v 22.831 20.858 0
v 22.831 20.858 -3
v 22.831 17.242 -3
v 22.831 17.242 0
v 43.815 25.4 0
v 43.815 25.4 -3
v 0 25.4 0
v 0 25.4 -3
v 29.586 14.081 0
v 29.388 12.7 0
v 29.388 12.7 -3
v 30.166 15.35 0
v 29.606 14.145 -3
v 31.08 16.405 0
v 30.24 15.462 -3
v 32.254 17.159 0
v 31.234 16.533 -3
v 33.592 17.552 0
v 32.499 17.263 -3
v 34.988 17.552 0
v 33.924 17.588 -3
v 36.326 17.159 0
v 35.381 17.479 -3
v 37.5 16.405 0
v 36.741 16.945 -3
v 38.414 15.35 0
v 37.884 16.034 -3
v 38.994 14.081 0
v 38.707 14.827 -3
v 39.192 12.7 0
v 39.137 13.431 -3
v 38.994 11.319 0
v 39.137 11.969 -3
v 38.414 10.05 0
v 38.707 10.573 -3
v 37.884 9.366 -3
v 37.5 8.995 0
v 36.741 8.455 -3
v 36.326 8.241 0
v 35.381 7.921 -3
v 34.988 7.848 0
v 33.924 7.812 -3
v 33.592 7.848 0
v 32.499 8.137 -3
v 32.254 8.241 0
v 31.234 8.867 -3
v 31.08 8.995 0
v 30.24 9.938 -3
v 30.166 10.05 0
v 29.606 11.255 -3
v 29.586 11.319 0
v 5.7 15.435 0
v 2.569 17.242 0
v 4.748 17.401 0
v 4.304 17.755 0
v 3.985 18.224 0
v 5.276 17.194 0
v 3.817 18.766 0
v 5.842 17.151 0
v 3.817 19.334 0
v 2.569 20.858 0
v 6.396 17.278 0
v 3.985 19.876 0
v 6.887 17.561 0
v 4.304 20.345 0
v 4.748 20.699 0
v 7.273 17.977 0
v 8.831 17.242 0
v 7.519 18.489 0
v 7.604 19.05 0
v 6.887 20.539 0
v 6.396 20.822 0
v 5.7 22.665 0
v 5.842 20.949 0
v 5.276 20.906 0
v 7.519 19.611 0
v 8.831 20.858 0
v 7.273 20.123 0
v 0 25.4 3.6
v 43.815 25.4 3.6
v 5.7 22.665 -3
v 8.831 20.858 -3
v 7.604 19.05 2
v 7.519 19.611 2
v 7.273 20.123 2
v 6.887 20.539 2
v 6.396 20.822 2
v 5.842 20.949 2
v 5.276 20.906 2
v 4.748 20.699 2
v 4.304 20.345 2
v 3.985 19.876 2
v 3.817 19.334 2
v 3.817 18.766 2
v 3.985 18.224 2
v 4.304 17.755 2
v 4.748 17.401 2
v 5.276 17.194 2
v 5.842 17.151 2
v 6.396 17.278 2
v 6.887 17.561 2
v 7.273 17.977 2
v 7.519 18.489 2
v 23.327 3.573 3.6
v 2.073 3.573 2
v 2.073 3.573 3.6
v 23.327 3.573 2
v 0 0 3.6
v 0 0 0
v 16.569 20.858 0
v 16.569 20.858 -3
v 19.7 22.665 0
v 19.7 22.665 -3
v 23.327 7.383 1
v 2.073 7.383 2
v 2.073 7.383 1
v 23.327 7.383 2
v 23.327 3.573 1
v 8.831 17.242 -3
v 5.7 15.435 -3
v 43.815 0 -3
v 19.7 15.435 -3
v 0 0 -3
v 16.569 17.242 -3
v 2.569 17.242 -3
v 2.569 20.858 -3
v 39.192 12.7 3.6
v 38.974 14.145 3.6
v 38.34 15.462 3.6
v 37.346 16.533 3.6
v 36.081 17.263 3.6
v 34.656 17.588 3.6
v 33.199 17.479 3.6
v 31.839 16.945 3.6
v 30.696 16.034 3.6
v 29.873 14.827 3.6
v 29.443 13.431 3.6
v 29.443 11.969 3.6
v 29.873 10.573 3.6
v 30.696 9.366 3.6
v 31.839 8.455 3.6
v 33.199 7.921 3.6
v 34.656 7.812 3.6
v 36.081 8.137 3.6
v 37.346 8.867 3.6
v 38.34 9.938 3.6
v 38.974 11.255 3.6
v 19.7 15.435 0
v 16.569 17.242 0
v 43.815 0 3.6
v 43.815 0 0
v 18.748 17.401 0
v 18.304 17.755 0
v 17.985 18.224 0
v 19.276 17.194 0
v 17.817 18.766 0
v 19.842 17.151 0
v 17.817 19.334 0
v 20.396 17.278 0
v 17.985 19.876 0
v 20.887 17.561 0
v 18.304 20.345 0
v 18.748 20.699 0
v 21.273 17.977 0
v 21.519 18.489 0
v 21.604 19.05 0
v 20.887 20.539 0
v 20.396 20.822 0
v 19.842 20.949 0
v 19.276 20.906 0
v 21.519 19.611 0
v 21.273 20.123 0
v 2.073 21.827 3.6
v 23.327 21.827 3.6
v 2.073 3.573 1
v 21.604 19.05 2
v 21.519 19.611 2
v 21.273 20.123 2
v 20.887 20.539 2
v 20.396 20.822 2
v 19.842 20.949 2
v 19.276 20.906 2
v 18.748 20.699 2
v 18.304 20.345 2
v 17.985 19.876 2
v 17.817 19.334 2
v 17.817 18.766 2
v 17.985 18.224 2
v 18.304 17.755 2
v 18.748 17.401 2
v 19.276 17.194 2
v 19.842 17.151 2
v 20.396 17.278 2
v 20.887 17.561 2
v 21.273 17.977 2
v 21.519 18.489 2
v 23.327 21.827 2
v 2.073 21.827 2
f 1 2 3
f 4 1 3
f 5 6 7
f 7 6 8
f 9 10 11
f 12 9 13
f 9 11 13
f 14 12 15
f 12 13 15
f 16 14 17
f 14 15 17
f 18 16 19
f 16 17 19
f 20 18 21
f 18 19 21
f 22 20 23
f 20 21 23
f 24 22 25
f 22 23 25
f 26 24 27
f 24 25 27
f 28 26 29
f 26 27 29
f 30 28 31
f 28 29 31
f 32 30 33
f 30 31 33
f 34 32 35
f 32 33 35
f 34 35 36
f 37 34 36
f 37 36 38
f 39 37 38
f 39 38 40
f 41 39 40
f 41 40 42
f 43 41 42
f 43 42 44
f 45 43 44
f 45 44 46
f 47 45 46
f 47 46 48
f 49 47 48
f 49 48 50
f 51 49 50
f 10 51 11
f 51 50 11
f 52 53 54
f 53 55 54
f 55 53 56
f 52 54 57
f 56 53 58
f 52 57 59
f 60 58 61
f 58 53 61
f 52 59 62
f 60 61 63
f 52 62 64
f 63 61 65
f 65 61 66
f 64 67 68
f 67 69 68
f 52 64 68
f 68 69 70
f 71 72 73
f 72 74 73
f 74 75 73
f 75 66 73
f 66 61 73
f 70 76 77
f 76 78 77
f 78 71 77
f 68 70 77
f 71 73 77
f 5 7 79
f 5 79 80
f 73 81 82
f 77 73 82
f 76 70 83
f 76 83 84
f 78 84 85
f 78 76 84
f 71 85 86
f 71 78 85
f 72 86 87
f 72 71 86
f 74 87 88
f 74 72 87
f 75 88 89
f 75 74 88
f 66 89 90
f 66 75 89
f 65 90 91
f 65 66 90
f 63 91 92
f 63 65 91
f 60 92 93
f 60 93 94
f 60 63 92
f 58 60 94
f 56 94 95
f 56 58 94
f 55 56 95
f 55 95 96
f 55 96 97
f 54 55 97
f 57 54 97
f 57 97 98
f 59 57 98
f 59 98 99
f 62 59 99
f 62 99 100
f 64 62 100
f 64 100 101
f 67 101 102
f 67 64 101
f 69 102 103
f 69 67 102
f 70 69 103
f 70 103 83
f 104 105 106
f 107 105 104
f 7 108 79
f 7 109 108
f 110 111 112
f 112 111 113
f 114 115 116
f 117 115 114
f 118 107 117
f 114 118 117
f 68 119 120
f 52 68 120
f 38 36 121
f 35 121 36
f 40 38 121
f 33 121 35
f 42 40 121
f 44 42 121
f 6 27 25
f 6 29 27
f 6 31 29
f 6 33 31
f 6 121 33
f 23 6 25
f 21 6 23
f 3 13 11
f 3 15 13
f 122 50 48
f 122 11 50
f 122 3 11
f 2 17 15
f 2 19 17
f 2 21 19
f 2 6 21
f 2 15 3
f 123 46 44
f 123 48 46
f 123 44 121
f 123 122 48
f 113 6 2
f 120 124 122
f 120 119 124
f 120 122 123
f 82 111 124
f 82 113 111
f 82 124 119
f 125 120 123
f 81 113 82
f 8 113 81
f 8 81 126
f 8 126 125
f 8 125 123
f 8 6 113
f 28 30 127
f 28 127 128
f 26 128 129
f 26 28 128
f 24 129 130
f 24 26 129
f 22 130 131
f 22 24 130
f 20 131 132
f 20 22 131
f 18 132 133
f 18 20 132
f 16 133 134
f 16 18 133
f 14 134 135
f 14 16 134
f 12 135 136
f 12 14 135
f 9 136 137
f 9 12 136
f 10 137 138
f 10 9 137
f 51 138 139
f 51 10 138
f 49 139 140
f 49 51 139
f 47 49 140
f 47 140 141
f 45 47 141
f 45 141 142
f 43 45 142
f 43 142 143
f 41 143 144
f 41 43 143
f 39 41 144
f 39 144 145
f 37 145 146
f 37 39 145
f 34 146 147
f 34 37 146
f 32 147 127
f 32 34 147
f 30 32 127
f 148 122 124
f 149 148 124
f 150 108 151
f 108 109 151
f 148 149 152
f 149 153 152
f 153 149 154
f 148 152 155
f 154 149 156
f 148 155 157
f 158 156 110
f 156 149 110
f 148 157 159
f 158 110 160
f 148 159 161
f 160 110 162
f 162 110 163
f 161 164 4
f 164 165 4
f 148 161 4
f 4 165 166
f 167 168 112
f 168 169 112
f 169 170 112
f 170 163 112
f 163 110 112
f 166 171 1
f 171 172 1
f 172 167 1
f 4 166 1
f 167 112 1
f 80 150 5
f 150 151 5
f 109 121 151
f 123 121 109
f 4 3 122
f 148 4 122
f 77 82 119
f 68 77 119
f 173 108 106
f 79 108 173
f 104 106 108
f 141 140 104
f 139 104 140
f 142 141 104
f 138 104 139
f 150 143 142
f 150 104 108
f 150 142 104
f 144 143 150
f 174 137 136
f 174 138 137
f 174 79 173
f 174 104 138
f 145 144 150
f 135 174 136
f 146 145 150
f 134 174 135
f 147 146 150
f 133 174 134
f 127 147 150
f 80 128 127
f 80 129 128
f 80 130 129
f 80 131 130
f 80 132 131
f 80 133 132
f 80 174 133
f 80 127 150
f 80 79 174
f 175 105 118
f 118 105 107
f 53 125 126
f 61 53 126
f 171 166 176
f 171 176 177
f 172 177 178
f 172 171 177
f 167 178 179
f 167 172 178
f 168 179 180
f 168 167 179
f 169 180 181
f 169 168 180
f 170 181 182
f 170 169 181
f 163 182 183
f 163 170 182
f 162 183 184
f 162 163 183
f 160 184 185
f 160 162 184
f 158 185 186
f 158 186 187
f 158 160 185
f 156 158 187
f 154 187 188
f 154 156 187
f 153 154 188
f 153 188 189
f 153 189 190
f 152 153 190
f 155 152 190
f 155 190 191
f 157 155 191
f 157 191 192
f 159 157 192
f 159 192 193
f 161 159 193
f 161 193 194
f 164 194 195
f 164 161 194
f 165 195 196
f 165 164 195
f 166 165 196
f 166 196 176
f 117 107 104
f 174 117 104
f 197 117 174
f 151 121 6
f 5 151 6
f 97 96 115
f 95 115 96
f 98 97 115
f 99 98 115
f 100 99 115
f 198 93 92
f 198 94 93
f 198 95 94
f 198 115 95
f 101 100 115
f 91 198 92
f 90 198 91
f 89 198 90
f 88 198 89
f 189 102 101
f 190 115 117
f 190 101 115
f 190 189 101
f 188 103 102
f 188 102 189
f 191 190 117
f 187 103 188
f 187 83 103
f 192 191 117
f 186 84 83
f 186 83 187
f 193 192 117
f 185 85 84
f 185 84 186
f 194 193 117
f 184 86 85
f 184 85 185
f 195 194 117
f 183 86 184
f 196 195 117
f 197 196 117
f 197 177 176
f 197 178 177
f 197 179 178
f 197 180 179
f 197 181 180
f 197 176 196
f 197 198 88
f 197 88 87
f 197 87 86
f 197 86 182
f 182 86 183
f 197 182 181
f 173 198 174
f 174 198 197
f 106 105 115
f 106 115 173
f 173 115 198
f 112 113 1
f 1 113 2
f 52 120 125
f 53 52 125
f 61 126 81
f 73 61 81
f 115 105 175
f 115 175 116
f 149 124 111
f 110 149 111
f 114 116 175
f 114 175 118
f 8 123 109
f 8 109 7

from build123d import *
from build123d.topology import SkipClean

# Parameters (mm, degrees)
SKETCH1_W           = 43.815
SKETCH1_H           = 25.4
SKETCH1_R           = 1.9039967
SKETCH1_R_2         = 4.9022
BOSS_EXTRUDE1_DEPTH = 2
SKETCH2_W           = 43.815
SKETCH2_H           = 25.4
SKETCH2_R           = 4.9022
SKETCH2_W_2         = 21.254
SKETCH2_H_2         = 18.254
BOSS_EXTRUDE2_DEPTH = 1.6
BOSS_EXTRUDE3_START = 3
SKETCH3_W           = 43.815
SKETCH3_H           = 25.4
SKETCH3_R           = 4.9022
BOSS_EXTRUDE3_DEPTH = 3
SKETCH5_W           = 21.254
SKETCH5_H           = 3.81
CUT_EXTRUDE1_DEPTH  = 1


with BuildPart() as part:
    # Sketch1 → Boss-Extrude1 (new body)
    with BuildSketch(Plane.XY):
        with Locations((21.9075, 12.7)):
            Rectangle(SKETCH1_W, SKETCH1_H)
        with Locations((5.7, 19.05)):
            Circle(SKETCH1_R, mode=Mode.SUBTRACT)
        with Locations((19.7, 19.05)):
            Circle(SKETCH1_R, mode=Mode.SUBTRACT)
        with Locations((34.29, 12.7)):
            Circle(SKETCH1_R_2, mode=Mode.SUBTRACT)
    extrude(amount=BOSS_EXTRUDE1_DEPTH)

    # Sketch2 → Boss-Extrude2 (add)
    with BuildSketch(Plane.XY.offset(2)):
        with Locations((21.9075, 12.7)):
            Rectangle(SKETCH2_W, SKETCH2_H)
        with Locations((34.29, 12.7)):
            Circle(SKETCH2_R, mode=Mode.SUBTRACT)
        with Locations((12.7, 12.7)):
            Rectangle(SKETCH2_W_2, SKETCH2_H_2, mode=Mode.SUBTRACT)
    extrude(amount=BOSS_EXTRUDE2_DEPTH)

    # Sketch3 → Boss-Extrude3 (add)
    with SkipClean():  # the faces are left unmerged after this step: merging them gives an invalid solid
        with BuildSketch(Plane(origin=(0, 0, 0), x_dir=(-1, 0, 0), z_dir=(0, 0, -1)).offset(BOSS_EXTRUDE3_START)):
            with Locations((-21.9075, 12.7)):
                Rectangle(SKETCH3_W, SKETCH3_H)
            with Locations((-34.29, 12.7)):
                Circle(SKETCH3_R, mode=Mode.SUBTRACT)
            Polygon((-16.5690055, 17.242319483), (-16.5690055, 20.857680517), (-19.7, 22.665361035), (-22.8309945, 20.857680517), (-22.8309945, 17.242319483), (-19.7, 15.434638965), align=None, mode=Mode.SUBTRACT)
            Polygon((-2.5690055, 20.857680517), (-5.7, 22.665361035), (-8.8309945, 20.857680517), (-8.8309945, 17.242319483), (-5.7, 15.434638965), (-2.5690055, 17.242319483), align=None, mode=Mode.SUBTRACT)
        extrude(amount=-BOSS_EXTRUDE3_DEPTH)

    # Sketch5 → Cut-Extrude1 (cut)
    with SkipClean():  # the faces are left unmerged after this step: merging them gives an invalid solid
        with BuildSketch(Plane.XY.offset(2)):
            with Locations((12.7, 5.478)):
                Rectangle(SKETCH5_W, SKETCH5_H)
        extrude(amount=-CUT_EXTRUDE1_DEPTH, mode=Mode.SUBTRACT)


solid = part.part
